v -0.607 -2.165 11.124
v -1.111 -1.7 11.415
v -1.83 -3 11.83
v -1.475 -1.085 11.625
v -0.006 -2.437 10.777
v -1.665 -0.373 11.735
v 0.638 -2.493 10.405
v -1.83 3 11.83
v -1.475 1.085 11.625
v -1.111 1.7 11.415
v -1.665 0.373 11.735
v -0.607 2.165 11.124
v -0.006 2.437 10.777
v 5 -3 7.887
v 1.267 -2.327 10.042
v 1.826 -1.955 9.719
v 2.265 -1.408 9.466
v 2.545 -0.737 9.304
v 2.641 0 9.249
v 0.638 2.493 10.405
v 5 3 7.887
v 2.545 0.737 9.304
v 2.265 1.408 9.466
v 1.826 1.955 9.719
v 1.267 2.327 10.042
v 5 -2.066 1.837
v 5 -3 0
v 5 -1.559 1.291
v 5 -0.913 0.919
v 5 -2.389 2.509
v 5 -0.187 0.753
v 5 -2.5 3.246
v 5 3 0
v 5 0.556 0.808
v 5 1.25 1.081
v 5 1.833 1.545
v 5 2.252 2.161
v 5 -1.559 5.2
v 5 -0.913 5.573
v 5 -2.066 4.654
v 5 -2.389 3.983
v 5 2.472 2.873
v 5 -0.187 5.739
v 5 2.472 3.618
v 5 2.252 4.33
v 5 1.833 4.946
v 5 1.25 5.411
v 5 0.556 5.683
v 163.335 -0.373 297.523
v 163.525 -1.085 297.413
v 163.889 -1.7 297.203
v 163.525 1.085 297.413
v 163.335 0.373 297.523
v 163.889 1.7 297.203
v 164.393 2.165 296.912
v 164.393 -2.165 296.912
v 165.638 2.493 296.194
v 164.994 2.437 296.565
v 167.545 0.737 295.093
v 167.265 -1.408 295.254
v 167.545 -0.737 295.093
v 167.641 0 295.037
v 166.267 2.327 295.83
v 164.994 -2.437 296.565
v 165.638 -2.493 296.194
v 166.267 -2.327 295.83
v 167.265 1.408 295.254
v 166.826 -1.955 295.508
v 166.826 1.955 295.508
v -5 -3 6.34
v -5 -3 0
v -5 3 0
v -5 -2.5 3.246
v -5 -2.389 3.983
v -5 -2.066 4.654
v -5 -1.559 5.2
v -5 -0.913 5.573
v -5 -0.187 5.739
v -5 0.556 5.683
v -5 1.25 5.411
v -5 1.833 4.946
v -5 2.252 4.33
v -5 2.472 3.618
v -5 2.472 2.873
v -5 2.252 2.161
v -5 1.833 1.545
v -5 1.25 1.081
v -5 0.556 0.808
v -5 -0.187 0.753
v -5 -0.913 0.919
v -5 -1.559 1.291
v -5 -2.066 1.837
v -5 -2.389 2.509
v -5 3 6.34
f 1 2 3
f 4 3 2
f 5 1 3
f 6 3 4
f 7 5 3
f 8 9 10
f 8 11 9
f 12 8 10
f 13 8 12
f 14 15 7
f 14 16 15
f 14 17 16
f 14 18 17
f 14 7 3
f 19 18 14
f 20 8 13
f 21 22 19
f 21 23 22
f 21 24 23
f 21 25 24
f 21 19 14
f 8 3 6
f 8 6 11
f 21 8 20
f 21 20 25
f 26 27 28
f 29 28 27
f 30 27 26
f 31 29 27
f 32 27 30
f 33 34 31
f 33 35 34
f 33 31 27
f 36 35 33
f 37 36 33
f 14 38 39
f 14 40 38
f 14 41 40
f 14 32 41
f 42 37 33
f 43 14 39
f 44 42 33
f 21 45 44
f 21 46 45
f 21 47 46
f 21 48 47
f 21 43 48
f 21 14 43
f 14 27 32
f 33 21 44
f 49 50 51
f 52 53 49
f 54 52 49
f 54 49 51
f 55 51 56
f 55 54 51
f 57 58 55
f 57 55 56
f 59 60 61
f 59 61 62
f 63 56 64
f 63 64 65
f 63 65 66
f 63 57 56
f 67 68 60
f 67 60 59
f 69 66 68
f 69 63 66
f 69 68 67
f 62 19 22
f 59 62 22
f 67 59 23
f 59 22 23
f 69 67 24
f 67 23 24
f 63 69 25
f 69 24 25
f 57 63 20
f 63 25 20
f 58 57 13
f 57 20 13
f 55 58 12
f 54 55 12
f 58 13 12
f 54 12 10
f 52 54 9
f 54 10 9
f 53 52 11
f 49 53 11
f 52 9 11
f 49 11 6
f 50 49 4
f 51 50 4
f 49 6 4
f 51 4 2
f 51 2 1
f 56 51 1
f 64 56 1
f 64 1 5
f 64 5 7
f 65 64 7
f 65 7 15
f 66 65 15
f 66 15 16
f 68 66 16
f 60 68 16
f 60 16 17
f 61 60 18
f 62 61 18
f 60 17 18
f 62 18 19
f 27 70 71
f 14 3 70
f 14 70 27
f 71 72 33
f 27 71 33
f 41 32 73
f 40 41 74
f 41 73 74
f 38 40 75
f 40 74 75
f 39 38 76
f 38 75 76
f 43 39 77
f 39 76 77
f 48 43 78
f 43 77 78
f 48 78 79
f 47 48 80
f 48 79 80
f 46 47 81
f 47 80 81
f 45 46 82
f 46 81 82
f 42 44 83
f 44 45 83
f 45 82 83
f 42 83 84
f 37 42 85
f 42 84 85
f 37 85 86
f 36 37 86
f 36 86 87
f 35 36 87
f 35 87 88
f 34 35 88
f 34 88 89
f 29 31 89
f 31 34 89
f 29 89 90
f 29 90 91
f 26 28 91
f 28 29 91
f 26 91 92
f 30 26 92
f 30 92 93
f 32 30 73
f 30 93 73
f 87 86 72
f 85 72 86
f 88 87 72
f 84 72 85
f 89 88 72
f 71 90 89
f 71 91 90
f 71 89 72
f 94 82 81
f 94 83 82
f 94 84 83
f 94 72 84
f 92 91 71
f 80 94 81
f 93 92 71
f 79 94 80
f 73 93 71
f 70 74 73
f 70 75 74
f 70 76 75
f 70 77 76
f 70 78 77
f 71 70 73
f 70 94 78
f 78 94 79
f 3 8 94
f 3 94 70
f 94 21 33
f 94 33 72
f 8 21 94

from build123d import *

# Parameters (mm, degrees)
SKETCH1_W           = 10
SKETCH1_H           = 6
SKETCH5_R           = 2.5
CUT_EXTRUDE1_DEPTH  = 17.997170664
SKETCH6_R           = 2.5
BOSS_EXTRUDE1_DEPTH = 330


with BuildPart() as part:
    # Sweep2: sweep along a path in Sketch4
    with BuildLine(Plane(origin=(0, 0, 0), x_dir=(1, 0, 0), z_dir=(0, 1, 0))) as sweep2_path:
        Line((0, 0), (0, -5))
        Line((0, -5), (2.5, -9.330127019))
    # Sketch1 → Sweep2 (sweep)
    with BuildSketch(Plane.XY):
        Rectangle(SKETCH1_W, SKETCH1_H)
    sweep(path=sweep2_path.line, transition=Transition.RIGHT)

    # Sketch5 → Cut-Extrude1 (cut, through all)
    with BuildSketch(Plane.ZY.offset(5)):
        with Locations(Location((3.245776798, 0, 0), (0, 0, 270))):
            Circle(SKETCH5_R)
    extrude(amount=-CUT_EXTRUDE1_DEPTH, mode=Mode.SUBTRACT)

    # SurfaceCut1
    split(bisect_by=Plane(origin=(5, 0, 0), x_dir=(0, 0, -1), z_dir=(1, 0, 0)), keep=Keep.BOTTOM)

    # Sketch6 → Boss-Extrude1 (add)
    with BuildSketch(Plane(origin=(4.665063509, 0, 8.080127019), x_dir=(0.8660254037844379, 0, -0.5000000000000013), z_dir=(0.5000000000000012, 0, 0.8660254037844378))):
        with Locations((-4.837322129, 0)):
            Circle(SKETCH6_R)
    extrude(amount=BOSS_EXTRUDE1_DEPTH)


solid = part.part
